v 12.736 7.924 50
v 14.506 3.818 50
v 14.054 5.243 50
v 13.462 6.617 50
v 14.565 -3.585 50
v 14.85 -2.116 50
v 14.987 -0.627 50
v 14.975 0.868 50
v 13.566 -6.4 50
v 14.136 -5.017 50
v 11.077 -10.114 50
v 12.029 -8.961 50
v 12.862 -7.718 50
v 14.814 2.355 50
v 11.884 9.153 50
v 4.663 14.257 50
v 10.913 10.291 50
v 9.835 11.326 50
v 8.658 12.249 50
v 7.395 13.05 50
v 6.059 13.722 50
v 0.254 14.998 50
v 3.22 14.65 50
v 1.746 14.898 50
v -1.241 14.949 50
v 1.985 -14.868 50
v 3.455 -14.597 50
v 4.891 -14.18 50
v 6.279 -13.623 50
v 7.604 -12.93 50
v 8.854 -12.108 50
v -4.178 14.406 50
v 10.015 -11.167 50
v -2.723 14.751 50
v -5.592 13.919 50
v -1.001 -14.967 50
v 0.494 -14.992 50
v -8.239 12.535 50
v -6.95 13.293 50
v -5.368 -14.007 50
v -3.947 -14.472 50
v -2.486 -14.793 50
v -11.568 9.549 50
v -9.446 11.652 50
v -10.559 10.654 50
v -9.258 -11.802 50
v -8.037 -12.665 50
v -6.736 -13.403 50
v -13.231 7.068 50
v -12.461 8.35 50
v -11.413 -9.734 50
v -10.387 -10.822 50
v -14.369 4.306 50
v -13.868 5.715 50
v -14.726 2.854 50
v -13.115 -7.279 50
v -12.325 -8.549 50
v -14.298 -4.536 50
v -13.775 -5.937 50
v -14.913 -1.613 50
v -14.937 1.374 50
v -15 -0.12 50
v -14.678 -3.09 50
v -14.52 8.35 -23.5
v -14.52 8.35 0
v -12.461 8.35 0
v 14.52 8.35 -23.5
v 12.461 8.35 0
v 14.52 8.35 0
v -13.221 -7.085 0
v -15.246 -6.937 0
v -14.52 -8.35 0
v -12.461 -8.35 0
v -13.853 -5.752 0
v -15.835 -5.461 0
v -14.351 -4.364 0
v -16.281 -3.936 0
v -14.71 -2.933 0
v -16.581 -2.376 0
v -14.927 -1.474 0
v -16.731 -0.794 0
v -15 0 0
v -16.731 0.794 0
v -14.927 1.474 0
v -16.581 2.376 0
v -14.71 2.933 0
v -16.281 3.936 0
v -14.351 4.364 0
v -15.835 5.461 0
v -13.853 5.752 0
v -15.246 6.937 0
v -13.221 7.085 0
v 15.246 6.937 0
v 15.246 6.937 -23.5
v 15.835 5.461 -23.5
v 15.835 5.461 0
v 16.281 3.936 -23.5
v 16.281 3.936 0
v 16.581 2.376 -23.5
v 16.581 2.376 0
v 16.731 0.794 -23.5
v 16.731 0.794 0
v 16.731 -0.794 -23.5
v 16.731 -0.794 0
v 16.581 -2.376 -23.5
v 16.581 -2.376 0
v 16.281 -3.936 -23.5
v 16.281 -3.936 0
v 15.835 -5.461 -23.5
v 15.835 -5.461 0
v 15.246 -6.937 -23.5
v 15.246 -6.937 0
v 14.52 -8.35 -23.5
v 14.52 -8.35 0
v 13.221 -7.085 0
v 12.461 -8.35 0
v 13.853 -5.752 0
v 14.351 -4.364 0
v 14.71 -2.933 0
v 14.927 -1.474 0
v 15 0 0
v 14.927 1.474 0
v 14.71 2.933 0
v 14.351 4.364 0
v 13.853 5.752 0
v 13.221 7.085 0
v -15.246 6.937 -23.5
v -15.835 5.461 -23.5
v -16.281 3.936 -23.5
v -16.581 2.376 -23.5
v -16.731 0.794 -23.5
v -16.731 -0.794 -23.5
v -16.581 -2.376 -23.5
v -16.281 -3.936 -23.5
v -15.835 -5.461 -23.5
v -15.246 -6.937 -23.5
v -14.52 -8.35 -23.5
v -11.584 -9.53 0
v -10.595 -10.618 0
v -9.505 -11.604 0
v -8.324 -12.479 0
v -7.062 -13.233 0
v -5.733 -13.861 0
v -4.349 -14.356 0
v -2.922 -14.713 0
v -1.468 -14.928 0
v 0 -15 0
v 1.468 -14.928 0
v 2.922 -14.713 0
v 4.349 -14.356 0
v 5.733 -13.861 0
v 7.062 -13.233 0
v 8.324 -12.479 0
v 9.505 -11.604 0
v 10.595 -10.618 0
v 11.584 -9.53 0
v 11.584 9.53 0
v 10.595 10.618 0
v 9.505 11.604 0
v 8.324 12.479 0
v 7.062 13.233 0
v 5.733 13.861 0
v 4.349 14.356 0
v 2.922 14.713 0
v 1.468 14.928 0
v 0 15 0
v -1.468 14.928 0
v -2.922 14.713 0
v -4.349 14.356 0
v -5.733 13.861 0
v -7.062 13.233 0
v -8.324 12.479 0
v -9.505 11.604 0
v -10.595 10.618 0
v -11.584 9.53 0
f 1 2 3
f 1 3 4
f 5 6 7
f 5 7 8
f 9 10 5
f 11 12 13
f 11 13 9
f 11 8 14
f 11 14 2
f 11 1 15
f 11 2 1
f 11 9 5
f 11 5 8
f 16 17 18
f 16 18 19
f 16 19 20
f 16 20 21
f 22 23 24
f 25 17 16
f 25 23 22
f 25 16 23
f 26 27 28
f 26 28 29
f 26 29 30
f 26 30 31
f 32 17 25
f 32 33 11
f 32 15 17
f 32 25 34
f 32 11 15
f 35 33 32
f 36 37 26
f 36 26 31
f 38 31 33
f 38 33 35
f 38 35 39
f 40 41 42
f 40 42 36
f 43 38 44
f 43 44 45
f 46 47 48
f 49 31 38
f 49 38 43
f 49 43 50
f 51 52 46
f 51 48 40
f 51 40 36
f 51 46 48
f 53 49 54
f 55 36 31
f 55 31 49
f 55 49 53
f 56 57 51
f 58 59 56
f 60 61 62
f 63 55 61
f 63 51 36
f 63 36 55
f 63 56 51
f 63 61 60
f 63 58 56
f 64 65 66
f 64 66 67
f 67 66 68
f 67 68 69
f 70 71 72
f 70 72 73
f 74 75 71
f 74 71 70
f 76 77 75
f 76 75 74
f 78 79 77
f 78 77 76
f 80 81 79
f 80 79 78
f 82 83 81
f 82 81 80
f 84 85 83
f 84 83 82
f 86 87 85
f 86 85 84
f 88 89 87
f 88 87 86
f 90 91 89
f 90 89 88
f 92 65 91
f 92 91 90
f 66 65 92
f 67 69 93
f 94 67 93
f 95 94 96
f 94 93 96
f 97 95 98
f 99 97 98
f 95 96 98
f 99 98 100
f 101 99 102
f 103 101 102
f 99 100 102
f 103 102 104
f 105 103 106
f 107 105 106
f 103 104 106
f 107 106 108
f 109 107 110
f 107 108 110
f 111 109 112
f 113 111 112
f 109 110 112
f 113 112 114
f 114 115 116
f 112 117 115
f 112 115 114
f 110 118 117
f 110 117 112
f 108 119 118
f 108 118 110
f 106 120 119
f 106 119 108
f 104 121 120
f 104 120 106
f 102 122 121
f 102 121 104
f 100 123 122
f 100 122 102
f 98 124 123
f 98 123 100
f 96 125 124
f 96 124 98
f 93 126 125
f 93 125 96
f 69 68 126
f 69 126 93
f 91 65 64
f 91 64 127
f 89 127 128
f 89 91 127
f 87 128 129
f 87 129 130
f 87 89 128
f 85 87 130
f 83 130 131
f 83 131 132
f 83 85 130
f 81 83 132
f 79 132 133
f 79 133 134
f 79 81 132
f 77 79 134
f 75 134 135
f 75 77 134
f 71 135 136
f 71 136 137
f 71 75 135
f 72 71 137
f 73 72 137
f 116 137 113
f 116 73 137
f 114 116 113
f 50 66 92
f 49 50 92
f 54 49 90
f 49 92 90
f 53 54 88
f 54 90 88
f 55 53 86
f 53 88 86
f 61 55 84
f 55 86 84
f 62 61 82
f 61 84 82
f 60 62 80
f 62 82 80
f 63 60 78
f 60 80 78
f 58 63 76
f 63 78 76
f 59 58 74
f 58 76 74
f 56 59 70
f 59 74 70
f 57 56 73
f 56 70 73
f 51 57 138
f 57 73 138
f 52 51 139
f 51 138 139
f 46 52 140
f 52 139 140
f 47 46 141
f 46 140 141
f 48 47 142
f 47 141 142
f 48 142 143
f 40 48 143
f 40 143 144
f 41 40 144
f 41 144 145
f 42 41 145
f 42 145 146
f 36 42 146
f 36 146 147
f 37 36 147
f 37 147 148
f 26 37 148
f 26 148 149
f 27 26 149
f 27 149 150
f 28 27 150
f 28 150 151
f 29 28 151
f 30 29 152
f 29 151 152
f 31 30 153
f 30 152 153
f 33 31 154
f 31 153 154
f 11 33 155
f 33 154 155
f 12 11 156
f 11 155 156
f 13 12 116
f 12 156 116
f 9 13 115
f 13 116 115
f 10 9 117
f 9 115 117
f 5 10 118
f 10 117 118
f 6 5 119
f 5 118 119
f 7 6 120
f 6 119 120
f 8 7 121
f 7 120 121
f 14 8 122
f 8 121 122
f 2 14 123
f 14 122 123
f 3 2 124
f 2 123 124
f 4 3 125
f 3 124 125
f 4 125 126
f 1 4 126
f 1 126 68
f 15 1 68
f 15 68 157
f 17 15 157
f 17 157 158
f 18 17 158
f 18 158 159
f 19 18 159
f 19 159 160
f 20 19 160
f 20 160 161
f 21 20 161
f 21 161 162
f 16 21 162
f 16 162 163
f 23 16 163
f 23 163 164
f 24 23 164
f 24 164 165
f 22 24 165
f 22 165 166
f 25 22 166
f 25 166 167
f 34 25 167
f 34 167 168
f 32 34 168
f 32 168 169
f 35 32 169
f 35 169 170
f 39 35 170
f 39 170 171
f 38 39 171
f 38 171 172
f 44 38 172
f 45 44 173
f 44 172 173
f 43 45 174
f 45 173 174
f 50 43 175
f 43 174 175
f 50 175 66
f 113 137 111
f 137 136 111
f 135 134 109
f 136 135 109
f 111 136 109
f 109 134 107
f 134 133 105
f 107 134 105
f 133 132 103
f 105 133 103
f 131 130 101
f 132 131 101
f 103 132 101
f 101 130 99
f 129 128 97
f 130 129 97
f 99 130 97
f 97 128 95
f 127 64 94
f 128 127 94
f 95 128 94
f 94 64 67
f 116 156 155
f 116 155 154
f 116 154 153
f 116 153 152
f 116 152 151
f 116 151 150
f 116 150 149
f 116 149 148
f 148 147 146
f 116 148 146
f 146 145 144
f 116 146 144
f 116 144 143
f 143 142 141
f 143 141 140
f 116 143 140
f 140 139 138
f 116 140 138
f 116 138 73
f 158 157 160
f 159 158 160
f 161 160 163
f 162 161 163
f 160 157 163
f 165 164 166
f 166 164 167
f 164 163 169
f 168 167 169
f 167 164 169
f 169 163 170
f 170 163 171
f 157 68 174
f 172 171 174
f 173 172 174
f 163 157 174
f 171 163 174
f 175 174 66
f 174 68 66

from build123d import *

# Parameters (mm, degrees)
SKETCH_1_W      = 29.04066115
SKETCH_1_H      = 16.7
EXTRUDE_3_DEPTH = 23.5
SKETCH_3_R      = 15
EXTRUDE_4_DEPTH = 50


with BuildPart() as part:
    # 草图1 → 凸台-拉伸3 (new body)
    with BuildSketch(Plane.XY):
        Rectangle(SKETCH_1_W, SKETCH_1_H)
        with BuildLine():
            Line((-14.520330575, -8.35), (-14.520330575, 8.35))
            ThreePointArc((-14.520330575, 8.35), (-16.75, 0), (-14.520330575, -8.35))
        make_face()
        with BuildLine():
            Line((14.520330575, -8.35), (14.520330575, 8.35))
            ThreePointArc((14.520330575, 8.35), (16.75, 0), (14.520330575, -8.35))
        make_face()
    extrude(amount=-EXTRUDE_3_DEPTH)

    # 草图3 → 凸台-拉伸4 (add)
    with BuildSketch(Plane.XY):
        with Locations(Location((0, 0, 0), (0, 0, 146.174412464))):
            Circle(SKETCH_3_R)
    extrude(amount=EXTRUDE_4_DEPTH)


solid = part.part
